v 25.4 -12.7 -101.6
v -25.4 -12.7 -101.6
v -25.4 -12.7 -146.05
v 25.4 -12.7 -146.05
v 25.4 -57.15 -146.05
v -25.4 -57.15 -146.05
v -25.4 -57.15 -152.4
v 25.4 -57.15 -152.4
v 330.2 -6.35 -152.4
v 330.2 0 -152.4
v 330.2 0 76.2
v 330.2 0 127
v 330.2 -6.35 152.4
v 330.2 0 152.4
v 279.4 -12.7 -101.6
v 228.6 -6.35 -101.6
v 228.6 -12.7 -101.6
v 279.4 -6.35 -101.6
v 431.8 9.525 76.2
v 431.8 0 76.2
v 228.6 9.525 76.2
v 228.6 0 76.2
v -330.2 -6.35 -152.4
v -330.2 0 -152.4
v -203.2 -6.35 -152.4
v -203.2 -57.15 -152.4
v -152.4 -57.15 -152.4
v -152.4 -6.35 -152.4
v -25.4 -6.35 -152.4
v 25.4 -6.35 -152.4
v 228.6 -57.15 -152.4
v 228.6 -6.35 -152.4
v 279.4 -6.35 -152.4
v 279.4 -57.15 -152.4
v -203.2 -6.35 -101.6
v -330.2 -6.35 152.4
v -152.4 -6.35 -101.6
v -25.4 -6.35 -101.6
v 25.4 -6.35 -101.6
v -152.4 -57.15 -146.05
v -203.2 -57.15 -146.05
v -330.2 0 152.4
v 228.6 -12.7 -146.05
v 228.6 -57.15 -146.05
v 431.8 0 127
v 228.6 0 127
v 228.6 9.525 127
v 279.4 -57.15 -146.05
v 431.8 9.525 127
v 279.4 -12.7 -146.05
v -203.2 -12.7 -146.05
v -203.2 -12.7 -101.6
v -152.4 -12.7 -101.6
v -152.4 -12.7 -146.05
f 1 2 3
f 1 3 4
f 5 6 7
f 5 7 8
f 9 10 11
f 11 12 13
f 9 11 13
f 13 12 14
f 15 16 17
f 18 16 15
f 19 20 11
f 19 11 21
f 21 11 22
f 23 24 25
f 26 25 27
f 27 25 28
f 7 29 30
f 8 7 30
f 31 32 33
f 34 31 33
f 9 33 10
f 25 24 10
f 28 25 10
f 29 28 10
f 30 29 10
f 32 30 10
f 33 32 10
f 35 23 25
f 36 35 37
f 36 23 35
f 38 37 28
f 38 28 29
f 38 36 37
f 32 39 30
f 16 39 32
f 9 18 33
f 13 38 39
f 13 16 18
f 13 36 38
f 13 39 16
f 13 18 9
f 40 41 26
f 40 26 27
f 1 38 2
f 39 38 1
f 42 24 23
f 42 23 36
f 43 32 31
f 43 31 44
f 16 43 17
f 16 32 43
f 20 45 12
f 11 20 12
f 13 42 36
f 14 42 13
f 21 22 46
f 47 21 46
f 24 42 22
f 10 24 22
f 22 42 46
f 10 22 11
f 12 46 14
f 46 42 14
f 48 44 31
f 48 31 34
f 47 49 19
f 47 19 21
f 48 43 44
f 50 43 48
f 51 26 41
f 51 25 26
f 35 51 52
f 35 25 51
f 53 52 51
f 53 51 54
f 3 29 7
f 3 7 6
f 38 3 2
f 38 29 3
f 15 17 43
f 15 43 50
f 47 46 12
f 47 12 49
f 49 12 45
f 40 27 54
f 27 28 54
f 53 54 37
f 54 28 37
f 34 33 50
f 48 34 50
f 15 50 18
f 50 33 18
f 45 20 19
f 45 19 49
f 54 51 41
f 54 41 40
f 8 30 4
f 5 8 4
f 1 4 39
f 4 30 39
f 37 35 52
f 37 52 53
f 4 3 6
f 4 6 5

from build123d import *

# Parameters (mm, degrees)
F0_W     = 660.4
F0_H     = 304.8
F1_DEPTH = 6.35
F2_W     = 50.8
F2_H     = 50.8
F3_DEPTH = 6.35
F4_W     = 50.8
F4_H     = 6.35
F5_W     = 50.8
F5_H     = 6.35
F6_W     = 50.8
F6_H     = 6.35
F7_DEPTH = 44.45
F8_W     = 101.6
F8_H     = 50.8
F9_DEPTH = 9.525


with BuildPart() as f1:
    # F0 (on Front) → F1 (new body)
    with BuildSketch(Plane.XZ):
        Rectangle(F0_W, F0_H)
    extrude(amount=F1_DEPTH)

    # F2 (on face) → F3 (join)
    with BuildSketch(Plane.XZ.offset(6.35)):
        with Locations((254, -127)):
            Rectangle(F2_W, F2_H)
        with Locations((0, -127)):
            Rectangle(F2_W, F2_H)
        with Locations((-177.8, -127)):
            Rectangle(F2_W, F2_H)
    extrude(amount=F3_DEPTH)

    # F4 (on face) + F5 (on face) + F6 (on face) → F7 (join)
    with BuildSketch(Plane.XZ.offset(12.7)):
        with Locations((-177.8, -149.225)):
            Rectangle(F4_W, F4_H)
    with BuildSketch(Plane.XZ.offset(12.7)):
        with Locations((0, -149.225)):
            Rectangle(F5_W, F5_H)
    with BuildSketch(Plane.XZ.offset(12.7)):
        with Locations((254, -149.225)):
            Rectangle(F6_W, F6_H)
    extrude(amount=F7_DEPTH)

    # F8 (on face) → F9 (join)
    with BuildSketch(Plane(origin=(0, 0, 0), x_dir=(-1, 0, 0), z_dir=(0, 1, 0))):
        with Locations((-381, 101.6)):
            Rectangle(F8_W, F8_H)
        with Locations((-279.4, 101.6)):
            Rectangle(F8_W, F8_H)
    extrude(amount=F9_DEPTH)


solid = f1.part
